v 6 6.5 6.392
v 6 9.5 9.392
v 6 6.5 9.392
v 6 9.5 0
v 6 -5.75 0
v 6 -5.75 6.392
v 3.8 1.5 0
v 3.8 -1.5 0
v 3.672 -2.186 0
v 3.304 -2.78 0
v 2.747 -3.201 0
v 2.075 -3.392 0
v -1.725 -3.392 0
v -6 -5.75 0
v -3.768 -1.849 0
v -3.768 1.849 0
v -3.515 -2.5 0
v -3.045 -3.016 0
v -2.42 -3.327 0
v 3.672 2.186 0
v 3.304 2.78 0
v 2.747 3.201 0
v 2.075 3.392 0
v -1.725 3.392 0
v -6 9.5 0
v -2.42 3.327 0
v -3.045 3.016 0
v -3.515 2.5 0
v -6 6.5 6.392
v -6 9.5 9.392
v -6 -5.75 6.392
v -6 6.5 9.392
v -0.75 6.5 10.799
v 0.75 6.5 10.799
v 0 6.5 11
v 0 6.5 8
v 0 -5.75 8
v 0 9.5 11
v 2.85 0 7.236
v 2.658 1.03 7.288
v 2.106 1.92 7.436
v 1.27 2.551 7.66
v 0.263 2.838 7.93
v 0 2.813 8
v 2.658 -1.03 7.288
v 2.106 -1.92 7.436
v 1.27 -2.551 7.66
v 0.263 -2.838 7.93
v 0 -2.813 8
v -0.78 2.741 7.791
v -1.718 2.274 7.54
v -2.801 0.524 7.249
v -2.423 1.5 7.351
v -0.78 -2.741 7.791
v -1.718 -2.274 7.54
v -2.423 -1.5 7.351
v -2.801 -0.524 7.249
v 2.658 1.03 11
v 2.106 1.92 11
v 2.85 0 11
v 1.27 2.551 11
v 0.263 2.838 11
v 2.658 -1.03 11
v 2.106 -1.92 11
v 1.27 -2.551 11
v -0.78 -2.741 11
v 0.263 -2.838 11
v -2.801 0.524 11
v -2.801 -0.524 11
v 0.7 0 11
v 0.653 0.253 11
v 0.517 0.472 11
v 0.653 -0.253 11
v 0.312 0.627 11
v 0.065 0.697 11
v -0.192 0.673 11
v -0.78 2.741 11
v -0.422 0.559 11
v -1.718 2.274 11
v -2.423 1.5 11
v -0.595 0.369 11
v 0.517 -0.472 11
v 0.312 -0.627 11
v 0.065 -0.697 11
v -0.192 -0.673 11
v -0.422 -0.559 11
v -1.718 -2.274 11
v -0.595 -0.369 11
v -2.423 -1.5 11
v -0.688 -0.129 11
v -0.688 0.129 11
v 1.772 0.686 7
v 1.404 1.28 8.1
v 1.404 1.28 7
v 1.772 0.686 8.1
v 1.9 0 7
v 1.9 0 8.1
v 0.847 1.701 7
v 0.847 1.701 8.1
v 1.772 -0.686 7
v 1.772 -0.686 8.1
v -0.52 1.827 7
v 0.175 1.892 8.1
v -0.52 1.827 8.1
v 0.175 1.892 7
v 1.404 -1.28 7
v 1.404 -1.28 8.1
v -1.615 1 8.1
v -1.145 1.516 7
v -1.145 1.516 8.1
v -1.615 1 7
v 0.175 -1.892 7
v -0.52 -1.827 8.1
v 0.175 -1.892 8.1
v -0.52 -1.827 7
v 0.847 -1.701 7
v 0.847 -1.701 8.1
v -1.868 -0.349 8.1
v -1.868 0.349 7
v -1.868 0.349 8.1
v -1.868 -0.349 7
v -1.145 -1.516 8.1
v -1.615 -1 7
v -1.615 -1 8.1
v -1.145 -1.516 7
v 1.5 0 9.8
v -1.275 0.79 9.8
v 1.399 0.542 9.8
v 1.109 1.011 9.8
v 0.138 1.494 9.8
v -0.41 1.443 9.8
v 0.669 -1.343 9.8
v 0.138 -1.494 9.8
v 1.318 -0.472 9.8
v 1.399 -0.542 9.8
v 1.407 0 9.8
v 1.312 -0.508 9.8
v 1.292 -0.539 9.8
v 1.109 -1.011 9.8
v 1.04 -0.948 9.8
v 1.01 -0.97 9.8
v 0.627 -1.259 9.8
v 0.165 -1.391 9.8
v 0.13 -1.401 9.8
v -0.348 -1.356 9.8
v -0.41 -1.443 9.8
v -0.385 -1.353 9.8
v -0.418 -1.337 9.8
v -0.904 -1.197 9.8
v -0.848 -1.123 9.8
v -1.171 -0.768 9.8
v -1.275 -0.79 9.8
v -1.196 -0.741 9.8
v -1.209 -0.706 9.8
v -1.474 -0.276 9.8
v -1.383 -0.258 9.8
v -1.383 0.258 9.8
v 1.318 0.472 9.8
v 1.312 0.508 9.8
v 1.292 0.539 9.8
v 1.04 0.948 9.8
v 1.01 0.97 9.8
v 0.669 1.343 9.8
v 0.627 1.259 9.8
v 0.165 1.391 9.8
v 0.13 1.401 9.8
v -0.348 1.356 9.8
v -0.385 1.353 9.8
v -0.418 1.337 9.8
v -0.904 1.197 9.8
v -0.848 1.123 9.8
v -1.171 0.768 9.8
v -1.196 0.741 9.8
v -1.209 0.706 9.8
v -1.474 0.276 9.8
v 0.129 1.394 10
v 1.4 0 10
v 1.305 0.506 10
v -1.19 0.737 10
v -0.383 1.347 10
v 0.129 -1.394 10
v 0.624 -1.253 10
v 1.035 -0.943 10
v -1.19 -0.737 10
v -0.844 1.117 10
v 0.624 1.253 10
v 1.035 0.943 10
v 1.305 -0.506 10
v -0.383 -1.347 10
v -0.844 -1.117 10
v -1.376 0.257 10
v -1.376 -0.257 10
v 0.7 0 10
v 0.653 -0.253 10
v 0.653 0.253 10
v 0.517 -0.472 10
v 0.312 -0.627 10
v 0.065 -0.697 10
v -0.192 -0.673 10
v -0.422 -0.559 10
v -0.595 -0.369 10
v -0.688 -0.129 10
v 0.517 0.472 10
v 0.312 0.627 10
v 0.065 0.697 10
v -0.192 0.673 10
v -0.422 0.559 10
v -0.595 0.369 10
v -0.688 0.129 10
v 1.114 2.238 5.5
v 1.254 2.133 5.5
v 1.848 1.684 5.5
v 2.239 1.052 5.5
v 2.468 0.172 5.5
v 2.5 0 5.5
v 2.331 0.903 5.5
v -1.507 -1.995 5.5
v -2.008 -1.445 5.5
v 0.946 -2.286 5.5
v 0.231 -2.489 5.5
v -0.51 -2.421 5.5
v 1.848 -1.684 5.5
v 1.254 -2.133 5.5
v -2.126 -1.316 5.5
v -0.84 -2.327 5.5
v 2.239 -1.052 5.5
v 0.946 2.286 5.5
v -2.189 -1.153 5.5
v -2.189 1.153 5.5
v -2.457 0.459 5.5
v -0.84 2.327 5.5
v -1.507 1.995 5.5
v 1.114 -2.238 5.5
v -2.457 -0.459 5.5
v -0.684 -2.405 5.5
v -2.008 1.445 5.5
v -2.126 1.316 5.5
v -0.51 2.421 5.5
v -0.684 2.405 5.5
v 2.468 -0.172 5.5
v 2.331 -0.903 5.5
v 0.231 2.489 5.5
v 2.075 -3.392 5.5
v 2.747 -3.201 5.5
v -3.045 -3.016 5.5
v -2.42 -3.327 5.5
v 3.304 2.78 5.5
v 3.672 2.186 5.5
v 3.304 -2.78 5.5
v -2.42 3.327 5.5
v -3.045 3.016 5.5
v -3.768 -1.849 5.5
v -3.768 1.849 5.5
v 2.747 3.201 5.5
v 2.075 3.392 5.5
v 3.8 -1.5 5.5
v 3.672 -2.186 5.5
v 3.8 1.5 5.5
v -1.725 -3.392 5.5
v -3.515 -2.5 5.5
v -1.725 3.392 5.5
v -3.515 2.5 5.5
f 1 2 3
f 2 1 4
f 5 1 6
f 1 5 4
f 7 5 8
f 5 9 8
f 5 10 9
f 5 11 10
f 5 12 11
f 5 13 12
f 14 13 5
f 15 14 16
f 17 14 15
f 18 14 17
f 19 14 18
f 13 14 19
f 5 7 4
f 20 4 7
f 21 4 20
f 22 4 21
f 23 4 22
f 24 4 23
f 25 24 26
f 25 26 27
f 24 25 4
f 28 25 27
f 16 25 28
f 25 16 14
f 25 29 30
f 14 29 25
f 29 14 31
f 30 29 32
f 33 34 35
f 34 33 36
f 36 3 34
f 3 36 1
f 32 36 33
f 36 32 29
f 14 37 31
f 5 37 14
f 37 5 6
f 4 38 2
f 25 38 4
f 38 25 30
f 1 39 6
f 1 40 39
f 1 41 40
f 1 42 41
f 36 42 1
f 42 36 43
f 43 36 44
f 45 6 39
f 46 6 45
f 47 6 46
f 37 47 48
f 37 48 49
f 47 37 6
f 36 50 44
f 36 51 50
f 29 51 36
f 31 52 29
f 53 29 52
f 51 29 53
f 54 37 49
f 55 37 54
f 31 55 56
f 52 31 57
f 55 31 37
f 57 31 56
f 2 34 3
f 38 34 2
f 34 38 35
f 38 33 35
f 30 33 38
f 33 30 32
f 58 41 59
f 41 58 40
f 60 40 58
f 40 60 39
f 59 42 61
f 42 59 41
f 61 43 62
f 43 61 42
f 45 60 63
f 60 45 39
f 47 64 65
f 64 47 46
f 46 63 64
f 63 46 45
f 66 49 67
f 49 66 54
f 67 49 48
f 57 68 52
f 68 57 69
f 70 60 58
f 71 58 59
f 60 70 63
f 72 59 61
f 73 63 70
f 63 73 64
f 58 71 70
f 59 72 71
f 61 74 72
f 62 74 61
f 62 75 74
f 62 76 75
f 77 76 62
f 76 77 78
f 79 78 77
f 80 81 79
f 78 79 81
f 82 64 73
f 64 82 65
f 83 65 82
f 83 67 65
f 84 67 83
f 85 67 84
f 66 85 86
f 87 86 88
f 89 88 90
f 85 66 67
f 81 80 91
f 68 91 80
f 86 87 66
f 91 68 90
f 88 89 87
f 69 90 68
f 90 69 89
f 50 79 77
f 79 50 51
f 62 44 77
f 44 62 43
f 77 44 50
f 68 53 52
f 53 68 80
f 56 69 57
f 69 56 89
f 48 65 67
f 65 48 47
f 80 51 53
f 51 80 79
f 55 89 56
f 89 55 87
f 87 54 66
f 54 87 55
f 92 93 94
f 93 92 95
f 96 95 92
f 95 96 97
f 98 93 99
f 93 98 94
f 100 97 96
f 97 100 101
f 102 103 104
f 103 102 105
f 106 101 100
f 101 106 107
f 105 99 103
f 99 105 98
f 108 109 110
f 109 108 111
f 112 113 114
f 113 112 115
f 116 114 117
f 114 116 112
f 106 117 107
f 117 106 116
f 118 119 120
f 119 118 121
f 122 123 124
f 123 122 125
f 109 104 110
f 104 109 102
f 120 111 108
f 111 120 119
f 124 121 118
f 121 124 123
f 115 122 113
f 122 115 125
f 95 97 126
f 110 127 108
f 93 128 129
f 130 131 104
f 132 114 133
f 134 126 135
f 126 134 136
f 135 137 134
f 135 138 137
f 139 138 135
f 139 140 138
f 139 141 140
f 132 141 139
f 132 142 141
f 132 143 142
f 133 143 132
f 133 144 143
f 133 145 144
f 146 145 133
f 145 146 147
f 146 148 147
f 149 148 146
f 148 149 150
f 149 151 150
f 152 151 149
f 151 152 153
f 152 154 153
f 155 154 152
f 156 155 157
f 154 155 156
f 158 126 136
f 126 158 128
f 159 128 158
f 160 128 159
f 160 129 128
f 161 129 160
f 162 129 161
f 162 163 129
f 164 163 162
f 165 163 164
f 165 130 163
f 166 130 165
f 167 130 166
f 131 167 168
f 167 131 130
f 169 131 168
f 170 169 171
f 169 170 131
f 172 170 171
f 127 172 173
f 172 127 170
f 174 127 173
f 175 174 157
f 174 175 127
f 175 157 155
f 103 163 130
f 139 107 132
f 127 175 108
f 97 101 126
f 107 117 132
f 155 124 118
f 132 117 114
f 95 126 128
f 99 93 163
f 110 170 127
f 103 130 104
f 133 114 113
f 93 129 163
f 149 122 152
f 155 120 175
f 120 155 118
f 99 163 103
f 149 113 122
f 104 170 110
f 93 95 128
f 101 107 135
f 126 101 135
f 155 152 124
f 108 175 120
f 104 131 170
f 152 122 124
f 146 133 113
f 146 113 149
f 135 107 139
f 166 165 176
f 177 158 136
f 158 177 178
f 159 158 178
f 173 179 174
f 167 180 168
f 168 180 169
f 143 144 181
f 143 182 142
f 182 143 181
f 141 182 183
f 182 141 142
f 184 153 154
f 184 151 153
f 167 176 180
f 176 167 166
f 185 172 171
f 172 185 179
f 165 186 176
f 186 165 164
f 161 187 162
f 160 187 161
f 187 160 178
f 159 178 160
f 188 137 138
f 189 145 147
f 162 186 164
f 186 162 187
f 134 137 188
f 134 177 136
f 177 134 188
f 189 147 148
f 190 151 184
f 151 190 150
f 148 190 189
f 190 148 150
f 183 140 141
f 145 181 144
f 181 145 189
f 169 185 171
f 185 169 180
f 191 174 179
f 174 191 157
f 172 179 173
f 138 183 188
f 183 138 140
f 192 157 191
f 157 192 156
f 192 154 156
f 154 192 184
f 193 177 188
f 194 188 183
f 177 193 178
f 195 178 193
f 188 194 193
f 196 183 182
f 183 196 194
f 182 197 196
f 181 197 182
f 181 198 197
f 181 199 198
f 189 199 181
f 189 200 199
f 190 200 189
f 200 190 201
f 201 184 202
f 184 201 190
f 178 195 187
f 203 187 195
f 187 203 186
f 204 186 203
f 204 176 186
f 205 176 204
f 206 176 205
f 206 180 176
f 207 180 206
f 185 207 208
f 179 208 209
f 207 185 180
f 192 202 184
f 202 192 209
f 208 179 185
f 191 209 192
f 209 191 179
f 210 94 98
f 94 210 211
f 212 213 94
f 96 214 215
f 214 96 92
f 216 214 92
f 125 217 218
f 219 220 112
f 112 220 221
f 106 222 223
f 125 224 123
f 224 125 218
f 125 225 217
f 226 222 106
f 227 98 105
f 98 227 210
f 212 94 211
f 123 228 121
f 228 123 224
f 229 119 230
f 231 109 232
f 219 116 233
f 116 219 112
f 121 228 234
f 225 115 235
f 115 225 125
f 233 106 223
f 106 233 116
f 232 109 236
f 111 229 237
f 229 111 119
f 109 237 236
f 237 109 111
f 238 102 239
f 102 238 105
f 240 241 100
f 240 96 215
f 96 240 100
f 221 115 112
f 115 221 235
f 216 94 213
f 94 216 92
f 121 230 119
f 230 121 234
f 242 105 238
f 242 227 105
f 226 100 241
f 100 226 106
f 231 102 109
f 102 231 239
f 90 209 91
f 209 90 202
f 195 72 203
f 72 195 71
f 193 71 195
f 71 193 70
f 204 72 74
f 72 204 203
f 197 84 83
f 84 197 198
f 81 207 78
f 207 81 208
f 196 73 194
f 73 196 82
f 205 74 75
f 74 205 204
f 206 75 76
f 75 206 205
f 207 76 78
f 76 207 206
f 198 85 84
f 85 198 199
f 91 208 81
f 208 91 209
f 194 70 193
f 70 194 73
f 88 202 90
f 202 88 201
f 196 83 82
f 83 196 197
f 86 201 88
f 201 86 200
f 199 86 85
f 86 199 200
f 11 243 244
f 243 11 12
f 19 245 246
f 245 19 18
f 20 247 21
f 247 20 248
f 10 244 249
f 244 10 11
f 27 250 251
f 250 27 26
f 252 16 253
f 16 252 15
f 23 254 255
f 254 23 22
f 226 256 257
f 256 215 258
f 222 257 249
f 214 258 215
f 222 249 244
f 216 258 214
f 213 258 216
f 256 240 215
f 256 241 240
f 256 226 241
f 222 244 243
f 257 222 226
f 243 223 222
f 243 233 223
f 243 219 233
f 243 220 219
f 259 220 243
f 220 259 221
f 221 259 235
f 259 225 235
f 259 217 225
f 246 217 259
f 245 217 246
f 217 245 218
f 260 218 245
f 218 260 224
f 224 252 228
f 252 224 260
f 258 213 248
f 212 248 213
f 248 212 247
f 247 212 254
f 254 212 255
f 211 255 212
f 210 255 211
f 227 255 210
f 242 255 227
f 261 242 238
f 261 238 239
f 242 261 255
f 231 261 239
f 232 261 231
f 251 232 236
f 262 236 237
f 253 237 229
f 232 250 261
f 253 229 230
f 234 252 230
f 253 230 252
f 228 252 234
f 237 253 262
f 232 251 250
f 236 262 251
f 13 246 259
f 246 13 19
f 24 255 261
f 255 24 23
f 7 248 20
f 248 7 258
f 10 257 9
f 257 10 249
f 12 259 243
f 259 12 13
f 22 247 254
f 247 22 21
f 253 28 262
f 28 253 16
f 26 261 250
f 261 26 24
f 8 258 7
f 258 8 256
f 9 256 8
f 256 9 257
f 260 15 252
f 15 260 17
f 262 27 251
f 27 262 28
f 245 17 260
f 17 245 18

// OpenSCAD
thickness = 8;
angle = 15;
space = .4;
$fn = 17;

render() difference(){
    union(){
        cylinder(r = 2.85, h = thickness + 3);
        difference(){
            union(){
                translate([-6, -5.75, 0])
                    cube([12, 12.25, thickness]);
                translate([-6, 6.5, 0])
                    cube([12, 3, thickness + 3]);
            }
            translate([0, -5.75, thickness])
                rotate([0, angle, 0])
                    cube([12, 12.25, thickness]);
            translate([0, -5.75, thickness])
                rotate([0, -angle, 0])
                    translate([-12, 0, 0])
                        cube([12, 12.25, thickness]);
            translate([0, 6.5, thickness + 3])
                rotate([0, angle, 0])
                    cube([12, 3, thickness]);
            translate([0, 6.5, thickness + 3])
                rotate([0, -angle, 0])
                    translate([-12, 0, 0])
                        cube([12, 3, thickness]);
            
        }
        
    }
    
    cylinder(r = .3 + space, h = thickness + 3);
    difference(){
        intersection(){
            minkowski(){
            cube([3.8, 3, 9], true);
            cylinder(h = 1, r=1.5 + space);
            }
        }
    }
    translate([0, 0, 5]){
    cylinder(r1 = 2.3 + space, r2 = 1.5 + space, h = 2);
        translate([0, 0, 2]){
            cylinder(h = 1.1, r1 = 1.5 + space, r2 = 1.5 + space);
            translate([0, 0, 1.1]) 
                cylinder(h = 1.7, r1 = 1.5 + space, r2 = 1.1 + space);
            cylinder(h = 3, r1 = 1.1 + space, r2 = 1 + space);
        }
    }
}

//translate([0, 0, -8.])
//    rotate([0, 90, 0])
//        needle();

module needle(){
$fn = 20;
    rotate([0, -90, 0]){
        render() difference(){
            union(){
                translate([0, 0, .4])
                minkowski(){
                    cube([3.8, 3, .8], true);
                    cylinder(h = .1, r=1.5);
                }
                cylinder(h = 5, r=2.8);    
                translate([0, 0, 9]){
                    difference(){
                        intersection(){
                            minkowski(){
                            cube([3.8, 3, 10], true);
                                
                            cylinder(h = 1, r=1.5);
                            }
                            translate([0, 0, 2])
                            sphere(r = 7, $fn = 40);
                        }
                        translate([0, 0, 9]){
                            rotate_extrude(angle = 360){
                                translate([5.4, 0, 0])
                                    scale([.8, 1.1, 1])
                                        circle(r = 6, $fn = 40);
                            }
                        }
                    }
                }
                translate([0, 0, 15]){
                        cylinder(h = 1.1, r1 = 1.5, r2 = 1.5);
                        translate([0, 0, 1.1]) 
                            cylinder(h = 1.7, r1 = 1.5, r2 = 1.1);
                        cylinder(h = 3, r1 = 1.1, r2 = 1);
                    }
                //needle
                cylinder(h = 70, r = .3);
            }
            translate([-7, 0, 0]){
                cylinder(h = 15, r = 3.9, $fn = 40);
            }
            translate([7, 0, 0]){
                cylinder(h = 15, r = 3.9, $fn = 40);
            }
            cylinder(h = 7, r = 2.1);
            translate([0, 0, 7]){
                cylinder(h = 2, r1 = 2.1, r2 = .5);
                translate([0, 0, 2])
                    cylinder(h = 5, r1 = .5, r2 = .25);
            }
            cylinder(h = 70, r = .2);
        }
    }
}
